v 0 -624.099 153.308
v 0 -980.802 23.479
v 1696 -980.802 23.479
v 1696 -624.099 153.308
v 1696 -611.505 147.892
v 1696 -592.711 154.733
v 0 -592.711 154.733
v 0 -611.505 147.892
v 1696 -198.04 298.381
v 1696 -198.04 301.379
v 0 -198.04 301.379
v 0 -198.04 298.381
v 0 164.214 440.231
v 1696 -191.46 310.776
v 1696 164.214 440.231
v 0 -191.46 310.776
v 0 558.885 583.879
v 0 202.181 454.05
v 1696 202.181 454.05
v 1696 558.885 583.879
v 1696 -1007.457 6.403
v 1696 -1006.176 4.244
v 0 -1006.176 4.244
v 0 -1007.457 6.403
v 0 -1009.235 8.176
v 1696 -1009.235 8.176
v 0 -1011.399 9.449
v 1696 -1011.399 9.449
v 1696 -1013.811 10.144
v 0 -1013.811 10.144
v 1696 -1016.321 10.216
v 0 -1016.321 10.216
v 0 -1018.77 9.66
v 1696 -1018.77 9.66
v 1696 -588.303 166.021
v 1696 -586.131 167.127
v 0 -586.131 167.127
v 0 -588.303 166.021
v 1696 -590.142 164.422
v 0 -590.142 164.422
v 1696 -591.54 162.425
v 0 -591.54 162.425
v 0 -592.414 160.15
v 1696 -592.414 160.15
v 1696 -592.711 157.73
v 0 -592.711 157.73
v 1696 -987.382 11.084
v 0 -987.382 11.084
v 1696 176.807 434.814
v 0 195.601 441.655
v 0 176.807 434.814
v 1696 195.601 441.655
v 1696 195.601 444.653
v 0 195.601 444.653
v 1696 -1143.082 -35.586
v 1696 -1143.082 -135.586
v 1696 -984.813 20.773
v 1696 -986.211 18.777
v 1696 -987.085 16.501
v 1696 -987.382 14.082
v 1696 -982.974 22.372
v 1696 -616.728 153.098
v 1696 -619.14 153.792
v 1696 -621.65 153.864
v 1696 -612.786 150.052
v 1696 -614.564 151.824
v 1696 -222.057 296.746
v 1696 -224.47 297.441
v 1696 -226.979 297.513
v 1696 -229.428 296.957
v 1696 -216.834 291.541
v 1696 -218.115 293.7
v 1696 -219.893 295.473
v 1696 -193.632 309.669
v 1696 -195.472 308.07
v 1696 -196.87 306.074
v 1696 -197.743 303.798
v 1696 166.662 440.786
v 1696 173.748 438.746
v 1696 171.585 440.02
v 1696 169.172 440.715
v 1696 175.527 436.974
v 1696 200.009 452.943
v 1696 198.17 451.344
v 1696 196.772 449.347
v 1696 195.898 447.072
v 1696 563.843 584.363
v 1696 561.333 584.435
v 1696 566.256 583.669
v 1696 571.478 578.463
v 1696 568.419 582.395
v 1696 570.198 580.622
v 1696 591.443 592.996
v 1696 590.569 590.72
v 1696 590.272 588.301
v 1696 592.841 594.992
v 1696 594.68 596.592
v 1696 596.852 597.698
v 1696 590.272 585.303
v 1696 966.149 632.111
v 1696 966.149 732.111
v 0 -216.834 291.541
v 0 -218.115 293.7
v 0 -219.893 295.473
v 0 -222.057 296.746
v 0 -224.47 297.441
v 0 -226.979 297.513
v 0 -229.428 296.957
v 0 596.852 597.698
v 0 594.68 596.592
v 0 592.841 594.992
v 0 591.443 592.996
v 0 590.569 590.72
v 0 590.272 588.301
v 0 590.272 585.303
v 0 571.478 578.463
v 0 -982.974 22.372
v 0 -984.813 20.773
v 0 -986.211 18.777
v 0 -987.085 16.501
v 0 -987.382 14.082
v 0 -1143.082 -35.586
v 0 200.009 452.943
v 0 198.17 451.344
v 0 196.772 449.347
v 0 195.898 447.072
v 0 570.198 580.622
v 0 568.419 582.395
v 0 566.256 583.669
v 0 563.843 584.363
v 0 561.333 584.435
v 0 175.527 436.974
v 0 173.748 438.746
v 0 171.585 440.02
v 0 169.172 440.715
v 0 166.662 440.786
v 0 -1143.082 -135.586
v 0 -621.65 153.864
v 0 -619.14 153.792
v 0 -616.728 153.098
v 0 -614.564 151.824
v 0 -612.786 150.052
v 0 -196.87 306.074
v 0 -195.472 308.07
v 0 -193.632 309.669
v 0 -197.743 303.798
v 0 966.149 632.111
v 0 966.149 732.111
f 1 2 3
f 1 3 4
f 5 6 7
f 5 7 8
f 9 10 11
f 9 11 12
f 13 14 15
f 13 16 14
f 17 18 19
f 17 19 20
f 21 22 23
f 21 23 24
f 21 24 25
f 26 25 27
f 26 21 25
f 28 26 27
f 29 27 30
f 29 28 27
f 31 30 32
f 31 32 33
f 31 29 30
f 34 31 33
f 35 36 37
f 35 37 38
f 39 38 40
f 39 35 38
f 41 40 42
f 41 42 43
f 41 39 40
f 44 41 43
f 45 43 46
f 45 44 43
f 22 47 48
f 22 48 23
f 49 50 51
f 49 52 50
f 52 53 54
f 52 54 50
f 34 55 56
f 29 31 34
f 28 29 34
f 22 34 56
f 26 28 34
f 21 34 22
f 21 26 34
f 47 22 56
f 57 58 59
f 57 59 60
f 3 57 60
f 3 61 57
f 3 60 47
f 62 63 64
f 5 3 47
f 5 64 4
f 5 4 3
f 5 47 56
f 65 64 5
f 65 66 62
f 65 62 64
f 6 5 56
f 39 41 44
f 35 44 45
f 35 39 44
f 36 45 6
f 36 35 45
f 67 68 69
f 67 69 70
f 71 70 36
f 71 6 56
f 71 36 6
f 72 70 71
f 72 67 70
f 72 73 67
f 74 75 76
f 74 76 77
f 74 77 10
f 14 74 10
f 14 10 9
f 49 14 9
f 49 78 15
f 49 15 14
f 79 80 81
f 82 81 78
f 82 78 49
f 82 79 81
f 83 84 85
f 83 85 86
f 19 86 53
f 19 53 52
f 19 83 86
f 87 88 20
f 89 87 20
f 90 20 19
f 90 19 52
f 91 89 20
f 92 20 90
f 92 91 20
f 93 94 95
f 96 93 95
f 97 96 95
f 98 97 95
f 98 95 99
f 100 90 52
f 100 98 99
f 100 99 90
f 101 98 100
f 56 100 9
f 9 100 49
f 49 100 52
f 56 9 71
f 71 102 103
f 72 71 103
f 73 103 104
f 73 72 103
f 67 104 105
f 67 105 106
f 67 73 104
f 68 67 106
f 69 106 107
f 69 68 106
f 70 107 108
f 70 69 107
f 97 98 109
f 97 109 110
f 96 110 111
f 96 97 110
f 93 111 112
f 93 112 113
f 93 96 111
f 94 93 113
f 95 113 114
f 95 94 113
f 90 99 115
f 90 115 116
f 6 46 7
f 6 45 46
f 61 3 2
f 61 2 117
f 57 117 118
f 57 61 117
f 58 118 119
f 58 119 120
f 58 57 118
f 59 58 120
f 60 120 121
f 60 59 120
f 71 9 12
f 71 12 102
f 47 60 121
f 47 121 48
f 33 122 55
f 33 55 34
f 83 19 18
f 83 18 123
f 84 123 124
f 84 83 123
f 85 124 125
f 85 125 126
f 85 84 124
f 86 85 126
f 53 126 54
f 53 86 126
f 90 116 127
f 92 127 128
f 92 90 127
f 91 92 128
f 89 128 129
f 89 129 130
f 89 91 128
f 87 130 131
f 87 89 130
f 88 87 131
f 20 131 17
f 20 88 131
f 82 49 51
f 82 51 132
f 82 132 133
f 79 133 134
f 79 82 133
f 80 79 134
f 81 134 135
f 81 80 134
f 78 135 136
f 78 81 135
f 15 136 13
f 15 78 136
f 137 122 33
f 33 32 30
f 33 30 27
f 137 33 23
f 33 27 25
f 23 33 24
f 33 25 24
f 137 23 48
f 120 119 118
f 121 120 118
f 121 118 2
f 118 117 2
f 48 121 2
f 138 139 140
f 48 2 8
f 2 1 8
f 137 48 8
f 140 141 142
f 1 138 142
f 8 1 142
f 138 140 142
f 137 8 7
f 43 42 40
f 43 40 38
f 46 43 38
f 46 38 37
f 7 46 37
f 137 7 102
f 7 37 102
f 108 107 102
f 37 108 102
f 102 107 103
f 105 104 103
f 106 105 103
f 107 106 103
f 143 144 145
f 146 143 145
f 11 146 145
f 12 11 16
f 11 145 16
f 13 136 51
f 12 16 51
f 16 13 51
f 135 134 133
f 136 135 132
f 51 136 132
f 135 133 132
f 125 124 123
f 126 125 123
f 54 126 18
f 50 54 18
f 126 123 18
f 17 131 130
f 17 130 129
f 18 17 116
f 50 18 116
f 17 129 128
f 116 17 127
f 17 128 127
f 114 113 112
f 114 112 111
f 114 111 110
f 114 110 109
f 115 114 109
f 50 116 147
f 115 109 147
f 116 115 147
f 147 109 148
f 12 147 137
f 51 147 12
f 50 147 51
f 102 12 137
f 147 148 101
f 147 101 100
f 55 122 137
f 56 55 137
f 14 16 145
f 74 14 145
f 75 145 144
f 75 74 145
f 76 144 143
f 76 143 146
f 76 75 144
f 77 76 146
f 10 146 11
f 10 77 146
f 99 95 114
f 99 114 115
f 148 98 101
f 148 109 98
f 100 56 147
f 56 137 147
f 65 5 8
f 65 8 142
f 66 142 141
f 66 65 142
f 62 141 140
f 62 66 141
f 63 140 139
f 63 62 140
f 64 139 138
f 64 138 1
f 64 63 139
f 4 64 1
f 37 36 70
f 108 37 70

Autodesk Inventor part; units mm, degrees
ref_plane "YZ Plane" through (0, 0, 0) normal (1, 0, 0) x (0, 1, 0)
ref_plane "XZ Plane" through (0, 0, 0) normal (0, 1, 0) x (-1, 0, 0)
ref_plane "XY Plane" through (0, 0, 0) normal (0, 0, 1) x (1, 0, 0)
sketch "Sketch1" plane through (0, 0, 0) normal (1, 0, 0) x (0, 1, 0)
  line L0 (-1143.0823, -35.5862) -> (966.1492, 732.1113)
  line L1 (-1143.0823, -35.5862) -> (-1143.0823, -135.5862)
  line L2 (966.1492, 732.1113) -> (966.1492, 632.1113)
  line L3 (-1143.0823, -135.5862) -> (966.1492, 632.1113)
  point P0 (0, 0)
  point P1 (1136.1492, -719.9922)
extrude "Extrusion1" add sketch "Sketch1" along normal blind 1696
sketch "Sketch2" plane through (1696, 0, 0) normal (1, 0, 0) x (0, 0, -1)
  line L0 (-632.1113, 966.1492) -> (-732.1113, 966.1492) projected
  line L1 (-732.1113, 966.1492) -> (-595.3032, 590.2722)
  line L2 (-595.3032, 590.2722) -> (-585.3032, 590.2722)
  line L3 (-585.3032, 590.2722) -> (-578.4628, 571.4783)
  line L4 (-578.4628, 571.4783) -> (-588.4628, 571.4783)
  line L5 (-588.4628, 571.4783) -> (-451.6548, 195.6013)
  line L6 (-732.1113, 966.1492) -> (35.5862, -1143.0823) projected
  line L7 (-451.6548, 195.6013) -> (-441.6548, 195.6013)
  line L8 (-441.6548, 195.6013) -> (-434.8144, 176.8074)
  line L9 (-434.8144, 176.8074) -> (-445.1891, 177.8369)
  line L10 (-445.1891, 177.8369) -> (-308.381, -198.0401)
  line L11 (-308.381, -198.0401) -> (-298.381, -198.0401)
  line L12 (-298.381, -198.0401) -> (-291.5406, -216.834)
  line L13 (-291.5406, -216.834) -> (-301.5406, -216.834)
  line L14 (-301.5406, -216.834) -> (-164.7326, -592.711)
  line L15 (-164.7326, -592.711) -> (-154.7326, -592.711)
  line L16 (-154.7326, -592.711) -> (-147.8921, -611.5049)
  line L17 (-147.8921, -611.5049) -> (-157.8921, -611.5049)
  line L18 (-157.8921, -611.5049) -> (-21.0841, -987.3819)
  line L19 (-21.0841, -987.3819) -> (-11.0841, -987.3819)
  line L20 (-11.0841, -987.3819) -> (-4.2437, -1006.1758)
  line L21 (-4.2437, -1006.1758) -> (-14.2437, -1006.1758)
  line L22 (-14.2437, -1006.1758) -> (-595.3032, 590.2722)
  point P0 (0, 0)
  point P1 (-582.1113, 966.1492)
  dimension "d2" = 400
  dimension "d3" = 10
  dimension "d4" = 110
  dimension "d5" = 20
  dimension "d6" = 110
  dimension "d7" = 400
  dimension "d8" = 10
  dimension "d9" = 20
  dimension "d10" = 400
  dimension "d11" = 20
  dimension "d12" = 400
  dimension "d13" = 20
  dimension "d14" = 400
  dimension "d15" = 20
extrude "Extrusion2" cut sketch "Sketch2" against normal through all
fillet "Fillet1" radius 10 10 edges at (848, -1006.1758, 14.2437) (848, -987.3819, 21.0841) (848, -611.5049, 157.8921) (848, -592.711, 164.7326) (848, -216.834, 301.5406) (848, -198.0401, 308.381) (848, 177.8369, 445.1891) (848, 195.6013, 451.6548) (848, 571.4783, 588.4628) (848, 590.2722, 595.3032)
properties part number "side_curve_panel_02" material "Wood (Maple)"
